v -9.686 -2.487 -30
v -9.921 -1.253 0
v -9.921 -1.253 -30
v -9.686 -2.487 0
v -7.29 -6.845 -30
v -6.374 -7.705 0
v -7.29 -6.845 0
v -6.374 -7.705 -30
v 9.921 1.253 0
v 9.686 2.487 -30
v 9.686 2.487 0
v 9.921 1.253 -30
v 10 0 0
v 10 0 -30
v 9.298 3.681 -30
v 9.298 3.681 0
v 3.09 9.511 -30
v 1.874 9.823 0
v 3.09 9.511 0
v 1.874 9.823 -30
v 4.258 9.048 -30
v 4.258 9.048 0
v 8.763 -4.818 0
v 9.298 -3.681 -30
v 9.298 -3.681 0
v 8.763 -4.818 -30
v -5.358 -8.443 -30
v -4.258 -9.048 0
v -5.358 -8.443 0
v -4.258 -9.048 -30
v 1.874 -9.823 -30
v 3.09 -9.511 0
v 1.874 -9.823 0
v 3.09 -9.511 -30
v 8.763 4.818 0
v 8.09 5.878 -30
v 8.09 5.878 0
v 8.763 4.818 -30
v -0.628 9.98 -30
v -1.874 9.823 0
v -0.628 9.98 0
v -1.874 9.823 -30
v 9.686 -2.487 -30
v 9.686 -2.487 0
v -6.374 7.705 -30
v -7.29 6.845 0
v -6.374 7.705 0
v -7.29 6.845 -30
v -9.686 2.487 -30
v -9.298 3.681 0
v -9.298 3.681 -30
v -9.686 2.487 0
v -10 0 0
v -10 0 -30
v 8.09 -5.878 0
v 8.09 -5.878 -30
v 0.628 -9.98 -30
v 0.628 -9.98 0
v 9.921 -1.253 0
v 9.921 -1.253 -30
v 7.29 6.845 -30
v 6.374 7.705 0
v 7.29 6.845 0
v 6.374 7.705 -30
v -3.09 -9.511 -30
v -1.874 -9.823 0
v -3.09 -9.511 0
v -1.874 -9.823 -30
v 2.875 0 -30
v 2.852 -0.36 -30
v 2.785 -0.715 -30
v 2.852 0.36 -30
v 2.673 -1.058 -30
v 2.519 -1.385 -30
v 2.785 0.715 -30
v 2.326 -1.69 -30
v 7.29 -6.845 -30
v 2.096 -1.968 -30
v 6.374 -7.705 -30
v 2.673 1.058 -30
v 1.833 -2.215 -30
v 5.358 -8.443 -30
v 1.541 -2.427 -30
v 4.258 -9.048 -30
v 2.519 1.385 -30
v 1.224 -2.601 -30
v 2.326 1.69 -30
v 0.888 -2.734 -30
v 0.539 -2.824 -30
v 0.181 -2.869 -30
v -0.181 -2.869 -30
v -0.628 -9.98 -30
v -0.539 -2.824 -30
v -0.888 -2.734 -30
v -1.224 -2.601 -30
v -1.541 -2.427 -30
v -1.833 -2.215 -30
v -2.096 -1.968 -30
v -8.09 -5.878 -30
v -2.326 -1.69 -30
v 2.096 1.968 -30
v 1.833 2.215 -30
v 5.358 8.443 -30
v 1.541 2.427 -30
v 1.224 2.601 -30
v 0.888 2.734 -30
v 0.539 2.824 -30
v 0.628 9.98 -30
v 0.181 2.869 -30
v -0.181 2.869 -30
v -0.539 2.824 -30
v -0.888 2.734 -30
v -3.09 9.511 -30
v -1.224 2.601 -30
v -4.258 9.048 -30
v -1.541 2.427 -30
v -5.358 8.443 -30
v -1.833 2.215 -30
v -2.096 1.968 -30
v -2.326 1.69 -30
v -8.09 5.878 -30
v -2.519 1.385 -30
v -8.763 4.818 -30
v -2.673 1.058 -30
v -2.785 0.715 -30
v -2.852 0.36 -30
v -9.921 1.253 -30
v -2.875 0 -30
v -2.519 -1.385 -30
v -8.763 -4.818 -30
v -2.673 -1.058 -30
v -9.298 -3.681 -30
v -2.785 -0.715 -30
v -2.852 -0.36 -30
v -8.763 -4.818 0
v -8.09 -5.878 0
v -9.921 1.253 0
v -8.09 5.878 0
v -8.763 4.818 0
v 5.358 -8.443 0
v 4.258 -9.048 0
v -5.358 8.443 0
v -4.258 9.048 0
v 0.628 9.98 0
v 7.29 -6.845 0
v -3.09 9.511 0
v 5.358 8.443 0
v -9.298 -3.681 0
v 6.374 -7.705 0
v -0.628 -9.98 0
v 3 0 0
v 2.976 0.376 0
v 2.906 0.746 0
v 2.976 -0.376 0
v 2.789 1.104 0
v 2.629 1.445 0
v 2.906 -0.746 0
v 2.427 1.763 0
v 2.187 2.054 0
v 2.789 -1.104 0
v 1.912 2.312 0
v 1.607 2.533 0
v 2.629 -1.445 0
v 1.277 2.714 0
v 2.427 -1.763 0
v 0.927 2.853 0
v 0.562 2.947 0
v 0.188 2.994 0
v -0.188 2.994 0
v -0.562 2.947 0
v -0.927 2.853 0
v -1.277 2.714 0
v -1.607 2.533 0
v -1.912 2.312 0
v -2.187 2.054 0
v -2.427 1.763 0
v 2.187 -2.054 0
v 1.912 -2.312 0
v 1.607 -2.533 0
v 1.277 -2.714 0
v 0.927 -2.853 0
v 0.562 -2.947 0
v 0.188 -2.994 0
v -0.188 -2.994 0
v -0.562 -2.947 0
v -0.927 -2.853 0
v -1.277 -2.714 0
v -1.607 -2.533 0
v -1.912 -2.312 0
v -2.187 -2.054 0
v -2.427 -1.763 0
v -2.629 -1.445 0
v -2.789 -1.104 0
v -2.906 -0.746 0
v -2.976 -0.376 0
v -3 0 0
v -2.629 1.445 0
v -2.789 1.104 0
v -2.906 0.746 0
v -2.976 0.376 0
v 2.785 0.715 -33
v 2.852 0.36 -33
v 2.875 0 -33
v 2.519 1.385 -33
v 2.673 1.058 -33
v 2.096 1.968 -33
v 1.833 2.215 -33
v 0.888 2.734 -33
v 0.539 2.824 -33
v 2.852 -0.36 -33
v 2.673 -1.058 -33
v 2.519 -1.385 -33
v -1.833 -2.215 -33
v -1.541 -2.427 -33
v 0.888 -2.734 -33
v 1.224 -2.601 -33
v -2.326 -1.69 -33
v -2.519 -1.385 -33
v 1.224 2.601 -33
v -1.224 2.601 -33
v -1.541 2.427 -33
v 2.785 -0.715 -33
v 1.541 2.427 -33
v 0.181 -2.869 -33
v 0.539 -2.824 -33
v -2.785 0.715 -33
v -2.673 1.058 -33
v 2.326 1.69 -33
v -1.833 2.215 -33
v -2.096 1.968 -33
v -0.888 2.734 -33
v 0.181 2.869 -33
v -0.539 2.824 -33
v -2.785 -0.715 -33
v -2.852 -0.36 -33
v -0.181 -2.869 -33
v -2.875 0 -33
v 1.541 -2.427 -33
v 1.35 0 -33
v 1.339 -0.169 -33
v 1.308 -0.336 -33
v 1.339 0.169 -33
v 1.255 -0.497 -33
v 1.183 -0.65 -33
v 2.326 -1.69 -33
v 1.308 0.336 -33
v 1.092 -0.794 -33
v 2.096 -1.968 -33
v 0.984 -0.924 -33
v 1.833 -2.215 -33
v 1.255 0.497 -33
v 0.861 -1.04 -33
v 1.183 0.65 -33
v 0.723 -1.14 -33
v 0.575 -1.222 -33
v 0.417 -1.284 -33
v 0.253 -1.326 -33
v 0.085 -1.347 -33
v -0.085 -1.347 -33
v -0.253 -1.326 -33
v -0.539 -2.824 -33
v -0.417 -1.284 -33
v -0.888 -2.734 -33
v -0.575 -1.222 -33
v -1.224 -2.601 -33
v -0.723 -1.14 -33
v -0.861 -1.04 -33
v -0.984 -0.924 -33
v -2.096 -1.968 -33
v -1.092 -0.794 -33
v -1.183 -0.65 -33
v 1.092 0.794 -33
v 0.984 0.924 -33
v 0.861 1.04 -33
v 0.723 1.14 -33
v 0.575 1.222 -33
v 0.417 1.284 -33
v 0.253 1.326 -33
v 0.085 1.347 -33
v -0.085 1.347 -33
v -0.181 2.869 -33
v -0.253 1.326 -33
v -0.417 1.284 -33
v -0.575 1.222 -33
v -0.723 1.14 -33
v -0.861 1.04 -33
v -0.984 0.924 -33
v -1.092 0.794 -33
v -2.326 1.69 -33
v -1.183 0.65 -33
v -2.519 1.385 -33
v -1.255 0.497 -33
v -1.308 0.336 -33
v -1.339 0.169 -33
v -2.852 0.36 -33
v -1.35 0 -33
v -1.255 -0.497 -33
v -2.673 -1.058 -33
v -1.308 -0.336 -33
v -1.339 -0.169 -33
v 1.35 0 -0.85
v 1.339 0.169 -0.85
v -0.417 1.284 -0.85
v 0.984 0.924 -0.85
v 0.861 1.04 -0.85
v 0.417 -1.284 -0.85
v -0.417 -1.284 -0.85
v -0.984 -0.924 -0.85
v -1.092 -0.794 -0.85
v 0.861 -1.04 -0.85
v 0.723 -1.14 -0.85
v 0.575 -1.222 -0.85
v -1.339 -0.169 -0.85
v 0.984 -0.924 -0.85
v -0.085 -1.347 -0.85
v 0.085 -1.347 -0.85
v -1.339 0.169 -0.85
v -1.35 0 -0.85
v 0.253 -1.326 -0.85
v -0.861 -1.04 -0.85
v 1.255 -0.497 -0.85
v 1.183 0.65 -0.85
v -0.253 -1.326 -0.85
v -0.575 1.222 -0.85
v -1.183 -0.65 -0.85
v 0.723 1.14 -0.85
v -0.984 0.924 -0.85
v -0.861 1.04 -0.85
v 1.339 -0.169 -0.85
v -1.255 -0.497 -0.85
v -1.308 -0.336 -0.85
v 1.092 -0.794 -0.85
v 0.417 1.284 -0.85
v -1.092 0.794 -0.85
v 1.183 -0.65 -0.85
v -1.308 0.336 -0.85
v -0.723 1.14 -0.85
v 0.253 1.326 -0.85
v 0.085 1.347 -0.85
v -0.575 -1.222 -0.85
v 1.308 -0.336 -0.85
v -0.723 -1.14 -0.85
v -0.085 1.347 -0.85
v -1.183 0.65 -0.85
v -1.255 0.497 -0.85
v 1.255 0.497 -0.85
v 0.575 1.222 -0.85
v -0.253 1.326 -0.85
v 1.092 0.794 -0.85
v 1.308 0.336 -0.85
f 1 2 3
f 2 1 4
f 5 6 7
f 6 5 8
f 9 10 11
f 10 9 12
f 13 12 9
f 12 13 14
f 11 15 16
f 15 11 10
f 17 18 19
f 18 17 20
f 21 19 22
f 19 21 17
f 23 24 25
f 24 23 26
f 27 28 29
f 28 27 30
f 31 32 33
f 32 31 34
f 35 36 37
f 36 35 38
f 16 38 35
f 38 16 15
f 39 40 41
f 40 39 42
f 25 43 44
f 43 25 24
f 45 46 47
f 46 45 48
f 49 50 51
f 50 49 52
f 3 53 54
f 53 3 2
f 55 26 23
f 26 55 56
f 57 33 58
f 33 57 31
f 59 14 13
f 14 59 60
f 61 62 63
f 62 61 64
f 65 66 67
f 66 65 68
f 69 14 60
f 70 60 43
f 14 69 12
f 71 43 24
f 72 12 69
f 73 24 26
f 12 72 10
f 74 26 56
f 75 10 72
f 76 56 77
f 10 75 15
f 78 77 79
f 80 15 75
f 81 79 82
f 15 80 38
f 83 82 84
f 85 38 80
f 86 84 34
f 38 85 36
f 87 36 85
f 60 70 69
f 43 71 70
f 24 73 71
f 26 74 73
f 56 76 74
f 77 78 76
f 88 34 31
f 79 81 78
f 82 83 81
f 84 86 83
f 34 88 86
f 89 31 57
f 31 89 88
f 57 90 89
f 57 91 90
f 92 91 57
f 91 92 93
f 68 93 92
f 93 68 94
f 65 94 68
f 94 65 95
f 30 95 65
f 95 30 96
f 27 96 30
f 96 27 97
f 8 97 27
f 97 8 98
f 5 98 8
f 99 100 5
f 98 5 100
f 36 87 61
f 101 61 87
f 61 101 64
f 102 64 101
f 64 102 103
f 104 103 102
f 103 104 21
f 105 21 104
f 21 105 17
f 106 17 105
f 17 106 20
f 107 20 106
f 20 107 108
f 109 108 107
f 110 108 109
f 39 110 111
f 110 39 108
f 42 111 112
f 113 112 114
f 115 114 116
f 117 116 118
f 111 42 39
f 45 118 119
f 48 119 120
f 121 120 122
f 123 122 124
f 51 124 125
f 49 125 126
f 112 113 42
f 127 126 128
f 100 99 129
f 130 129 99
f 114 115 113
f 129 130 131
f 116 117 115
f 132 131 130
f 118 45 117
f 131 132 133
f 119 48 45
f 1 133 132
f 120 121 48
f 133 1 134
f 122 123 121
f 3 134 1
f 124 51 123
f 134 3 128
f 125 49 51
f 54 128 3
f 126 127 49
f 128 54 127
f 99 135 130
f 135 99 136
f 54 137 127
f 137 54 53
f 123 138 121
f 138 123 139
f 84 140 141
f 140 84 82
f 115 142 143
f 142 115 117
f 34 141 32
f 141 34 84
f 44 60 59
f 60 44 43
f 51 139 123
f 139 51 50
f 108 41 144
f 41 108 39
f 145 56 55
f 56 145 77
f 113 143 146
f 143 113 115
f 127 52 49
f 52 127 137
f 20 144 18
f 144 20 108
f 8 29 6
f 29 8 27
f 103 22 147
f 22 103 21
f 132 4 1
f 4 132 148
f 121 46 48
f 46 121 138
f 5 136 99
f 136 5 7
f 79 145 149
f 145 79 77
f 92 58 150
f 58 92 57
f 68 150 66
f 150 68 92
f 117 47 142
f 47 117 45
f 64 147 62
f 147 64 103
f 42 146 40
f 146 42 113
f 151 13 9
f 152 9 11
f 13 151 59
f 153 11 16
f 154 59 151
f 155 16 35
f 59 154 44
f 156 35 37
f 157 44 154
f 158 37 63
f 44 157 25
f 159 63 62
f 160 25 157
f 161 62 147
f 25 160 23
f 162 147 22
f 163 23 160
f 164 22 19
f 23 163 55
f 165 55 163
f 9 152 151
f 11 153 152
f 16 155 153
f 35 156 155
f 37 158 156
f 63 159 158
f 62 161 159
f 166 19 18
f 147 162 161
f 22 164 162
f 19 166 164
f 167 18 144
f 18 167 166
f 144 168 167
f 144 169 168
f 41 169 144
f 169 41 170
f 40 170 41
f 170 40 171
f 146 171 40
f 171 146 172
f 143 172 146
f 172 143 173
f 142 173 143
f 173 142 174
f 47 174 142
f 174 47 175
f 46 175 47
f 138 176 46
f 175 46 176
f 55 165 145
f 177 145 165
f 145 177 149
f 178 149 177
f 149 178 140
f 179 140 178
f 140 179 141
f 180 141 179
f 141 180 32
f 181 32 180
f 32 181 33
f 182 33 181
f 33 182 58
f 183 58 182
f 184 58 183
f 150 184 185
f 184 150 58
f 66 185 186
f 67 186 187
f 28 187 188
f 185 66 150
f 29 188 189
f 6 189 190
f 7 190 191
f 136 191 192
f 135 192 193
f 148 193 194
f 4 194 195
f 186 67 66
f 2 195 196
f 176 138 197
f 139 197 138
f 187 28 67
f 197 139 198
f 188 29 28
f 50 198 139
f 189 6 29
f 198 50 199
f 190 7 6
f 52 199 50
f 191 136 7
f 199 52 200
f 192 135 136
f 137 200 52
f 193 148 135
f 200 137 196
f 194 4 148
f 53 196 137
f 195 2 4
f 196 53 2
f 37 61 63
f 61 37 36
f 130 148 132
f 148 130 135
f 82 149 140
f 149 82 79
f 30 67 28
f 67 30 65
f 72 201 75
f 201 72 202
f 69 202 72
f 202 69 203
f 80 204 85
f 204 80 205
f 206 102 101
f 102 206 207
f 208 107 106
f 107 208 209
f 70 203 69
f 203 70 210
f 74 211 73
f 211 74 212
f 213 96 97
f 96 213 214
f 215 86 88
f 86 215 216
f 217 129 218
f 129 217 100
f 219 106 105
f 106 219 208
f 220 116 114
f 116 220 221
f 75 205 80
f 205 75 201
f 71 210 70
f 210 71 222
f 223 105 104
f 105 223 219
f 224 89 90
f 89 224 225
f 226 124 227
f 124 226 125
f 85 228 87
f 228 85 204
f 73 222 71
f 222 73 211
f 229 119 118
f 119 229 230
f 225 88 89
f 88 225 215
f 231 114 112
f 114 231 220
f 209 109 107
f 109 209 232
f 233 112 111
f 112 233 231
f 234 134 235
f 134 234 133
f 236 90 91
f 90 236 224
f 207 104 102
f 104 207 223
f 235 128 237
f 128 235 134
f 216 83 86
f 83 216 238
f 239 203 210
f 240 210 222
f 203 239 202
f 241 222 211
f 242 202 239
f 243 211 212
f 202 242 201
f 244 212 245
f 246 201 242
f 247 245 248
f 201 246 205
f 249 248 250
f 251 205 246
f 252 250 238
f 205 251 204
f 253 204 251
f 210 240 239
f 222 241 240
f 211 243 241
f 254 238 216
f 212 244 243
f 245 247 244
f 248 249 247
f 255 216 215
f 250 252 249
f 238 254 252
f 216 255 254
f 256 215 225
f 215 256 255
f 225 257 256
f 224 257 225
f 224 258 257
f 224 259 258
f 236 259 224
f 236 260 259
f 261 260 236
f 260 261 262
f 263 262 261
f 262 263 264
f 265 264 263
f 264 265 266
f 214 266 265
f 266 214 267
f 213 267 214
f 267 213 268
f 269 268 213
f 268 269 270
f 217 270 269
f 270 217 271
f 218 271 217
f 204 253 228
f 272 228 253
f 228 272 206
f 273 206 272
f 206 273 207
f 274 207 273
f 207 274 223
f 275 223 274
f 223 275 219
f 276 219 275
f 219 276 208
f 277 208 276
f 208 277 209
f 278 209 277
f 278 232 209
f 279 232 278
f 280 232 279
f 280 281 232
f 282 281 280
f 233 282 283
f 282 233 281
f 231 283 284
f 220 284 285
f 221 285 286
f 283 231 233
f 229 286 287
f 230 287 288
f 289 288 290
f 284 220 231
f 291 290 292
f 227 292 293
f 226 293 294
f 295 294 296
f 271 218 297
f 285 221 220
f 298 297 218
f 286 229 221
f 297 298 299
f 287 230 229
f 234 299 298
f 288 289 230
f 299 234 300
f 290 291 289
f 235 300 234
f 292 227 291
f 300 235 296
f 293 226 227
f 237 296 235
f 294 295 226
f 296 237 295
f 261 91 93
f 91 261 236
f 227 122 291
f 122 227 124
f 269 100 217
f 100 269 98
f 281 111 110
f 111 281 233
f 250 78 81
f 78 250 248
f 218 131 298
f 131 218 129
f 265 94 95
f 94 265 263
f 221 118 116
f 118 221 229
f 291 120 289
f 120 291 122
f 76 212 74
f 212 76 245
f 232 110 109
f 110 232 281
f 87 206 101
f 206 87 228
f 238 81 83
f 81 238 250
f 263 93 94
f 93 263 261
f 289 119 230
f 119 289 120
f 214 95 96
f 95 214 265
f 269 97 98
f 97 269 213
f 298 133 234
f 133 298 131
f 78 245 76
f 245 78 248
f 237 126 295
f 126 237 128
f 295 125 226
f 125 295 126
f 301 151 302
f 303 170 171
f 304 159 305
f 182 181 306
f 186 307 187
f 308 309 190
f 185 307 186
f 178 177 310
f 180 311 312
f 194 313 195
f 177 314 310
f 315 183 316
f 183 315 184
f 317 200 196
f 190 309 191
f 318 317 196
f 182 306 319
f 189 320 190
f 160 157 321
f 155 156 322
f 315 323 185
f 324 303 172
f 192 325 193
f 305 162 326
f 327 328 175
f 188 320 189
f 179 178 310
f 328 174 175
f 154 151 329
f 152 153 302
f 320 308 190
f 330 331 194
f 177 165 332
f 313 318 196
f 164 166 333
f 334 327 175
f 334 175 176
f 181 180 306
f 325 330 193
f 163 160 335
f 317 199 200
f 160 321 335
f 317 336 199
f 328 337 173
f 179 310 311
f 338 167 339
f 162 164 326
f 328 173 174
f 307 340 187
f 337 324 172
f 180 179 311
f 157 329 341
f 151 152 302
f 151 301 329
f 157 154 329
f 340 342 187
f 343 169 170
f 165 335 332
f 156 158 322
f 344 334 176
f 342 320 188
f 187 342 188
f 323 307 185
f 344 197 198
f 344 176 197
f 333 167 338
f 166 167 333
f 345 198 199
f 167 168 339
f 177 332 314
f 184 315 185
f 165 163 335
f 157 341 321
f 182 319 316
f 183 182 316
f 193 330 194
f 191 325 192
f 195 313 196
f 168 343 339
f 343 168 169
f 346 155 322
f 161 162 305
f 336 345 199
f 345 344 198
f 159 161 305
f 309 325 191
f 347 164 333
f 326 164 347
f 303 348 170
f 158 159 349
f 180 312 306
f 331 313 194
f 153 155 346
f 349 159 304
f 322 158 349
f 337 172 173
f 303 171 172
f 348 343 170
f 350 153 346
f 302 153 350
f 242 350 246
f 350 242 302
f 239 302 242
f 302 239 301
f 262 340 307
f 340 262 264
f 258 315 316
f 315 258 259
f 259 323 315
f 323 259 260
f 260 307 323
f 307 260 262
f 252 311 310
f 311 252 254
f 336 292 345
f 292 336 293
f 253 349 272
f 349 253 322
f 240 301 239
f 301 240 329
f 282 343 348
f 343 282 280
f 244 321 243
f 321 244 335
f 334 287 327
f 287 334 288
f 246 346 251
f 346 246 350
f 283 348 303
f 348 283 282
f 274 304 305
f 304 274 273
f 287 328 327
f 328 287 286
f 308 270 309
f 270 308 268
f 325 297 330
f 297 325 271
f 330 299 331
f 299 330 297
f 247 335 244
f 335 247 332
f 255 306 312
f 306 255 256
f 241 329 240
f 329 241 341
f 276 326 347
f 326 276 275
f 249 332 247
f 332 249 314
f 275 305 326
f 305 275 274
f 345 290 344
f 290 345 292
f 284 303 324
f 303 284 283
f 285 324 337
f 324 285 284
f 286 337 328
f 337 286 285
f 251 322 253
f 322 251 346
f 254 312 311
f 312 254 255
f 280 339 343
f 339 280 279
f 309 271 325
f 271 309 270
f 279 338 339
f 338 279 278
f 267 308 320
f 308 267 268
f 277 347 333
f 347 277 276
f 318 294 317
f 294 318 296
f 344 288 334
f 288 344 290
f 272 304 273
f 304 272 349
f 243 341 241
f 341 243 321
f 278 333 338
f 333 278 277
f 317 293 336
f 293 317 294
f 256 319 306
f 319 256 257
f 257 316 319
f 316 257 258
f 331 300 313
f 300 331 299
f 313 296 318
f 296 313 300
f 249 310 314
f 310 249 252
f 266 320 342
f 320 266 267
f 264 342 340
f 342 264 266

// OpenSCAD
$fn = 50;


difference() {
	union() {
		translate(v = [0, 0, -30.0000000000]) {
			cylinder(h = 30, r = 10.0000000000);
		}
		#translate(v = [0, 0, -33.0000000000]) {
			cylinder(h = 33, r = 2.8750000000);
		}
	}
	union() {
		translate(v = [0, 0, 0]) {
			rotate(a = [0, 0, 0]) {
				difference() {
					union() {
						translate(v = [0, 0, -33.0000000000]) {
							cylinder(h = 33, r = 1.0000000000);
						}
						translate(v = [0, 0, -0.8500000000]) {
							cylinder(h = 0.8500000000, r1 = 1.3500000000, r2 = 3.0000000000);
						}
						translate(v = [0, 0, -33.0000000000]) {
							cylinder(h = 33, r = 1.3500000000);
						}
						translate(v = [0, 0, -33.0000000000]) {
							cylinder(h = 33, r = 1.0000000000);
						}
					}
					union();
				}
			}
		}
	}
}
